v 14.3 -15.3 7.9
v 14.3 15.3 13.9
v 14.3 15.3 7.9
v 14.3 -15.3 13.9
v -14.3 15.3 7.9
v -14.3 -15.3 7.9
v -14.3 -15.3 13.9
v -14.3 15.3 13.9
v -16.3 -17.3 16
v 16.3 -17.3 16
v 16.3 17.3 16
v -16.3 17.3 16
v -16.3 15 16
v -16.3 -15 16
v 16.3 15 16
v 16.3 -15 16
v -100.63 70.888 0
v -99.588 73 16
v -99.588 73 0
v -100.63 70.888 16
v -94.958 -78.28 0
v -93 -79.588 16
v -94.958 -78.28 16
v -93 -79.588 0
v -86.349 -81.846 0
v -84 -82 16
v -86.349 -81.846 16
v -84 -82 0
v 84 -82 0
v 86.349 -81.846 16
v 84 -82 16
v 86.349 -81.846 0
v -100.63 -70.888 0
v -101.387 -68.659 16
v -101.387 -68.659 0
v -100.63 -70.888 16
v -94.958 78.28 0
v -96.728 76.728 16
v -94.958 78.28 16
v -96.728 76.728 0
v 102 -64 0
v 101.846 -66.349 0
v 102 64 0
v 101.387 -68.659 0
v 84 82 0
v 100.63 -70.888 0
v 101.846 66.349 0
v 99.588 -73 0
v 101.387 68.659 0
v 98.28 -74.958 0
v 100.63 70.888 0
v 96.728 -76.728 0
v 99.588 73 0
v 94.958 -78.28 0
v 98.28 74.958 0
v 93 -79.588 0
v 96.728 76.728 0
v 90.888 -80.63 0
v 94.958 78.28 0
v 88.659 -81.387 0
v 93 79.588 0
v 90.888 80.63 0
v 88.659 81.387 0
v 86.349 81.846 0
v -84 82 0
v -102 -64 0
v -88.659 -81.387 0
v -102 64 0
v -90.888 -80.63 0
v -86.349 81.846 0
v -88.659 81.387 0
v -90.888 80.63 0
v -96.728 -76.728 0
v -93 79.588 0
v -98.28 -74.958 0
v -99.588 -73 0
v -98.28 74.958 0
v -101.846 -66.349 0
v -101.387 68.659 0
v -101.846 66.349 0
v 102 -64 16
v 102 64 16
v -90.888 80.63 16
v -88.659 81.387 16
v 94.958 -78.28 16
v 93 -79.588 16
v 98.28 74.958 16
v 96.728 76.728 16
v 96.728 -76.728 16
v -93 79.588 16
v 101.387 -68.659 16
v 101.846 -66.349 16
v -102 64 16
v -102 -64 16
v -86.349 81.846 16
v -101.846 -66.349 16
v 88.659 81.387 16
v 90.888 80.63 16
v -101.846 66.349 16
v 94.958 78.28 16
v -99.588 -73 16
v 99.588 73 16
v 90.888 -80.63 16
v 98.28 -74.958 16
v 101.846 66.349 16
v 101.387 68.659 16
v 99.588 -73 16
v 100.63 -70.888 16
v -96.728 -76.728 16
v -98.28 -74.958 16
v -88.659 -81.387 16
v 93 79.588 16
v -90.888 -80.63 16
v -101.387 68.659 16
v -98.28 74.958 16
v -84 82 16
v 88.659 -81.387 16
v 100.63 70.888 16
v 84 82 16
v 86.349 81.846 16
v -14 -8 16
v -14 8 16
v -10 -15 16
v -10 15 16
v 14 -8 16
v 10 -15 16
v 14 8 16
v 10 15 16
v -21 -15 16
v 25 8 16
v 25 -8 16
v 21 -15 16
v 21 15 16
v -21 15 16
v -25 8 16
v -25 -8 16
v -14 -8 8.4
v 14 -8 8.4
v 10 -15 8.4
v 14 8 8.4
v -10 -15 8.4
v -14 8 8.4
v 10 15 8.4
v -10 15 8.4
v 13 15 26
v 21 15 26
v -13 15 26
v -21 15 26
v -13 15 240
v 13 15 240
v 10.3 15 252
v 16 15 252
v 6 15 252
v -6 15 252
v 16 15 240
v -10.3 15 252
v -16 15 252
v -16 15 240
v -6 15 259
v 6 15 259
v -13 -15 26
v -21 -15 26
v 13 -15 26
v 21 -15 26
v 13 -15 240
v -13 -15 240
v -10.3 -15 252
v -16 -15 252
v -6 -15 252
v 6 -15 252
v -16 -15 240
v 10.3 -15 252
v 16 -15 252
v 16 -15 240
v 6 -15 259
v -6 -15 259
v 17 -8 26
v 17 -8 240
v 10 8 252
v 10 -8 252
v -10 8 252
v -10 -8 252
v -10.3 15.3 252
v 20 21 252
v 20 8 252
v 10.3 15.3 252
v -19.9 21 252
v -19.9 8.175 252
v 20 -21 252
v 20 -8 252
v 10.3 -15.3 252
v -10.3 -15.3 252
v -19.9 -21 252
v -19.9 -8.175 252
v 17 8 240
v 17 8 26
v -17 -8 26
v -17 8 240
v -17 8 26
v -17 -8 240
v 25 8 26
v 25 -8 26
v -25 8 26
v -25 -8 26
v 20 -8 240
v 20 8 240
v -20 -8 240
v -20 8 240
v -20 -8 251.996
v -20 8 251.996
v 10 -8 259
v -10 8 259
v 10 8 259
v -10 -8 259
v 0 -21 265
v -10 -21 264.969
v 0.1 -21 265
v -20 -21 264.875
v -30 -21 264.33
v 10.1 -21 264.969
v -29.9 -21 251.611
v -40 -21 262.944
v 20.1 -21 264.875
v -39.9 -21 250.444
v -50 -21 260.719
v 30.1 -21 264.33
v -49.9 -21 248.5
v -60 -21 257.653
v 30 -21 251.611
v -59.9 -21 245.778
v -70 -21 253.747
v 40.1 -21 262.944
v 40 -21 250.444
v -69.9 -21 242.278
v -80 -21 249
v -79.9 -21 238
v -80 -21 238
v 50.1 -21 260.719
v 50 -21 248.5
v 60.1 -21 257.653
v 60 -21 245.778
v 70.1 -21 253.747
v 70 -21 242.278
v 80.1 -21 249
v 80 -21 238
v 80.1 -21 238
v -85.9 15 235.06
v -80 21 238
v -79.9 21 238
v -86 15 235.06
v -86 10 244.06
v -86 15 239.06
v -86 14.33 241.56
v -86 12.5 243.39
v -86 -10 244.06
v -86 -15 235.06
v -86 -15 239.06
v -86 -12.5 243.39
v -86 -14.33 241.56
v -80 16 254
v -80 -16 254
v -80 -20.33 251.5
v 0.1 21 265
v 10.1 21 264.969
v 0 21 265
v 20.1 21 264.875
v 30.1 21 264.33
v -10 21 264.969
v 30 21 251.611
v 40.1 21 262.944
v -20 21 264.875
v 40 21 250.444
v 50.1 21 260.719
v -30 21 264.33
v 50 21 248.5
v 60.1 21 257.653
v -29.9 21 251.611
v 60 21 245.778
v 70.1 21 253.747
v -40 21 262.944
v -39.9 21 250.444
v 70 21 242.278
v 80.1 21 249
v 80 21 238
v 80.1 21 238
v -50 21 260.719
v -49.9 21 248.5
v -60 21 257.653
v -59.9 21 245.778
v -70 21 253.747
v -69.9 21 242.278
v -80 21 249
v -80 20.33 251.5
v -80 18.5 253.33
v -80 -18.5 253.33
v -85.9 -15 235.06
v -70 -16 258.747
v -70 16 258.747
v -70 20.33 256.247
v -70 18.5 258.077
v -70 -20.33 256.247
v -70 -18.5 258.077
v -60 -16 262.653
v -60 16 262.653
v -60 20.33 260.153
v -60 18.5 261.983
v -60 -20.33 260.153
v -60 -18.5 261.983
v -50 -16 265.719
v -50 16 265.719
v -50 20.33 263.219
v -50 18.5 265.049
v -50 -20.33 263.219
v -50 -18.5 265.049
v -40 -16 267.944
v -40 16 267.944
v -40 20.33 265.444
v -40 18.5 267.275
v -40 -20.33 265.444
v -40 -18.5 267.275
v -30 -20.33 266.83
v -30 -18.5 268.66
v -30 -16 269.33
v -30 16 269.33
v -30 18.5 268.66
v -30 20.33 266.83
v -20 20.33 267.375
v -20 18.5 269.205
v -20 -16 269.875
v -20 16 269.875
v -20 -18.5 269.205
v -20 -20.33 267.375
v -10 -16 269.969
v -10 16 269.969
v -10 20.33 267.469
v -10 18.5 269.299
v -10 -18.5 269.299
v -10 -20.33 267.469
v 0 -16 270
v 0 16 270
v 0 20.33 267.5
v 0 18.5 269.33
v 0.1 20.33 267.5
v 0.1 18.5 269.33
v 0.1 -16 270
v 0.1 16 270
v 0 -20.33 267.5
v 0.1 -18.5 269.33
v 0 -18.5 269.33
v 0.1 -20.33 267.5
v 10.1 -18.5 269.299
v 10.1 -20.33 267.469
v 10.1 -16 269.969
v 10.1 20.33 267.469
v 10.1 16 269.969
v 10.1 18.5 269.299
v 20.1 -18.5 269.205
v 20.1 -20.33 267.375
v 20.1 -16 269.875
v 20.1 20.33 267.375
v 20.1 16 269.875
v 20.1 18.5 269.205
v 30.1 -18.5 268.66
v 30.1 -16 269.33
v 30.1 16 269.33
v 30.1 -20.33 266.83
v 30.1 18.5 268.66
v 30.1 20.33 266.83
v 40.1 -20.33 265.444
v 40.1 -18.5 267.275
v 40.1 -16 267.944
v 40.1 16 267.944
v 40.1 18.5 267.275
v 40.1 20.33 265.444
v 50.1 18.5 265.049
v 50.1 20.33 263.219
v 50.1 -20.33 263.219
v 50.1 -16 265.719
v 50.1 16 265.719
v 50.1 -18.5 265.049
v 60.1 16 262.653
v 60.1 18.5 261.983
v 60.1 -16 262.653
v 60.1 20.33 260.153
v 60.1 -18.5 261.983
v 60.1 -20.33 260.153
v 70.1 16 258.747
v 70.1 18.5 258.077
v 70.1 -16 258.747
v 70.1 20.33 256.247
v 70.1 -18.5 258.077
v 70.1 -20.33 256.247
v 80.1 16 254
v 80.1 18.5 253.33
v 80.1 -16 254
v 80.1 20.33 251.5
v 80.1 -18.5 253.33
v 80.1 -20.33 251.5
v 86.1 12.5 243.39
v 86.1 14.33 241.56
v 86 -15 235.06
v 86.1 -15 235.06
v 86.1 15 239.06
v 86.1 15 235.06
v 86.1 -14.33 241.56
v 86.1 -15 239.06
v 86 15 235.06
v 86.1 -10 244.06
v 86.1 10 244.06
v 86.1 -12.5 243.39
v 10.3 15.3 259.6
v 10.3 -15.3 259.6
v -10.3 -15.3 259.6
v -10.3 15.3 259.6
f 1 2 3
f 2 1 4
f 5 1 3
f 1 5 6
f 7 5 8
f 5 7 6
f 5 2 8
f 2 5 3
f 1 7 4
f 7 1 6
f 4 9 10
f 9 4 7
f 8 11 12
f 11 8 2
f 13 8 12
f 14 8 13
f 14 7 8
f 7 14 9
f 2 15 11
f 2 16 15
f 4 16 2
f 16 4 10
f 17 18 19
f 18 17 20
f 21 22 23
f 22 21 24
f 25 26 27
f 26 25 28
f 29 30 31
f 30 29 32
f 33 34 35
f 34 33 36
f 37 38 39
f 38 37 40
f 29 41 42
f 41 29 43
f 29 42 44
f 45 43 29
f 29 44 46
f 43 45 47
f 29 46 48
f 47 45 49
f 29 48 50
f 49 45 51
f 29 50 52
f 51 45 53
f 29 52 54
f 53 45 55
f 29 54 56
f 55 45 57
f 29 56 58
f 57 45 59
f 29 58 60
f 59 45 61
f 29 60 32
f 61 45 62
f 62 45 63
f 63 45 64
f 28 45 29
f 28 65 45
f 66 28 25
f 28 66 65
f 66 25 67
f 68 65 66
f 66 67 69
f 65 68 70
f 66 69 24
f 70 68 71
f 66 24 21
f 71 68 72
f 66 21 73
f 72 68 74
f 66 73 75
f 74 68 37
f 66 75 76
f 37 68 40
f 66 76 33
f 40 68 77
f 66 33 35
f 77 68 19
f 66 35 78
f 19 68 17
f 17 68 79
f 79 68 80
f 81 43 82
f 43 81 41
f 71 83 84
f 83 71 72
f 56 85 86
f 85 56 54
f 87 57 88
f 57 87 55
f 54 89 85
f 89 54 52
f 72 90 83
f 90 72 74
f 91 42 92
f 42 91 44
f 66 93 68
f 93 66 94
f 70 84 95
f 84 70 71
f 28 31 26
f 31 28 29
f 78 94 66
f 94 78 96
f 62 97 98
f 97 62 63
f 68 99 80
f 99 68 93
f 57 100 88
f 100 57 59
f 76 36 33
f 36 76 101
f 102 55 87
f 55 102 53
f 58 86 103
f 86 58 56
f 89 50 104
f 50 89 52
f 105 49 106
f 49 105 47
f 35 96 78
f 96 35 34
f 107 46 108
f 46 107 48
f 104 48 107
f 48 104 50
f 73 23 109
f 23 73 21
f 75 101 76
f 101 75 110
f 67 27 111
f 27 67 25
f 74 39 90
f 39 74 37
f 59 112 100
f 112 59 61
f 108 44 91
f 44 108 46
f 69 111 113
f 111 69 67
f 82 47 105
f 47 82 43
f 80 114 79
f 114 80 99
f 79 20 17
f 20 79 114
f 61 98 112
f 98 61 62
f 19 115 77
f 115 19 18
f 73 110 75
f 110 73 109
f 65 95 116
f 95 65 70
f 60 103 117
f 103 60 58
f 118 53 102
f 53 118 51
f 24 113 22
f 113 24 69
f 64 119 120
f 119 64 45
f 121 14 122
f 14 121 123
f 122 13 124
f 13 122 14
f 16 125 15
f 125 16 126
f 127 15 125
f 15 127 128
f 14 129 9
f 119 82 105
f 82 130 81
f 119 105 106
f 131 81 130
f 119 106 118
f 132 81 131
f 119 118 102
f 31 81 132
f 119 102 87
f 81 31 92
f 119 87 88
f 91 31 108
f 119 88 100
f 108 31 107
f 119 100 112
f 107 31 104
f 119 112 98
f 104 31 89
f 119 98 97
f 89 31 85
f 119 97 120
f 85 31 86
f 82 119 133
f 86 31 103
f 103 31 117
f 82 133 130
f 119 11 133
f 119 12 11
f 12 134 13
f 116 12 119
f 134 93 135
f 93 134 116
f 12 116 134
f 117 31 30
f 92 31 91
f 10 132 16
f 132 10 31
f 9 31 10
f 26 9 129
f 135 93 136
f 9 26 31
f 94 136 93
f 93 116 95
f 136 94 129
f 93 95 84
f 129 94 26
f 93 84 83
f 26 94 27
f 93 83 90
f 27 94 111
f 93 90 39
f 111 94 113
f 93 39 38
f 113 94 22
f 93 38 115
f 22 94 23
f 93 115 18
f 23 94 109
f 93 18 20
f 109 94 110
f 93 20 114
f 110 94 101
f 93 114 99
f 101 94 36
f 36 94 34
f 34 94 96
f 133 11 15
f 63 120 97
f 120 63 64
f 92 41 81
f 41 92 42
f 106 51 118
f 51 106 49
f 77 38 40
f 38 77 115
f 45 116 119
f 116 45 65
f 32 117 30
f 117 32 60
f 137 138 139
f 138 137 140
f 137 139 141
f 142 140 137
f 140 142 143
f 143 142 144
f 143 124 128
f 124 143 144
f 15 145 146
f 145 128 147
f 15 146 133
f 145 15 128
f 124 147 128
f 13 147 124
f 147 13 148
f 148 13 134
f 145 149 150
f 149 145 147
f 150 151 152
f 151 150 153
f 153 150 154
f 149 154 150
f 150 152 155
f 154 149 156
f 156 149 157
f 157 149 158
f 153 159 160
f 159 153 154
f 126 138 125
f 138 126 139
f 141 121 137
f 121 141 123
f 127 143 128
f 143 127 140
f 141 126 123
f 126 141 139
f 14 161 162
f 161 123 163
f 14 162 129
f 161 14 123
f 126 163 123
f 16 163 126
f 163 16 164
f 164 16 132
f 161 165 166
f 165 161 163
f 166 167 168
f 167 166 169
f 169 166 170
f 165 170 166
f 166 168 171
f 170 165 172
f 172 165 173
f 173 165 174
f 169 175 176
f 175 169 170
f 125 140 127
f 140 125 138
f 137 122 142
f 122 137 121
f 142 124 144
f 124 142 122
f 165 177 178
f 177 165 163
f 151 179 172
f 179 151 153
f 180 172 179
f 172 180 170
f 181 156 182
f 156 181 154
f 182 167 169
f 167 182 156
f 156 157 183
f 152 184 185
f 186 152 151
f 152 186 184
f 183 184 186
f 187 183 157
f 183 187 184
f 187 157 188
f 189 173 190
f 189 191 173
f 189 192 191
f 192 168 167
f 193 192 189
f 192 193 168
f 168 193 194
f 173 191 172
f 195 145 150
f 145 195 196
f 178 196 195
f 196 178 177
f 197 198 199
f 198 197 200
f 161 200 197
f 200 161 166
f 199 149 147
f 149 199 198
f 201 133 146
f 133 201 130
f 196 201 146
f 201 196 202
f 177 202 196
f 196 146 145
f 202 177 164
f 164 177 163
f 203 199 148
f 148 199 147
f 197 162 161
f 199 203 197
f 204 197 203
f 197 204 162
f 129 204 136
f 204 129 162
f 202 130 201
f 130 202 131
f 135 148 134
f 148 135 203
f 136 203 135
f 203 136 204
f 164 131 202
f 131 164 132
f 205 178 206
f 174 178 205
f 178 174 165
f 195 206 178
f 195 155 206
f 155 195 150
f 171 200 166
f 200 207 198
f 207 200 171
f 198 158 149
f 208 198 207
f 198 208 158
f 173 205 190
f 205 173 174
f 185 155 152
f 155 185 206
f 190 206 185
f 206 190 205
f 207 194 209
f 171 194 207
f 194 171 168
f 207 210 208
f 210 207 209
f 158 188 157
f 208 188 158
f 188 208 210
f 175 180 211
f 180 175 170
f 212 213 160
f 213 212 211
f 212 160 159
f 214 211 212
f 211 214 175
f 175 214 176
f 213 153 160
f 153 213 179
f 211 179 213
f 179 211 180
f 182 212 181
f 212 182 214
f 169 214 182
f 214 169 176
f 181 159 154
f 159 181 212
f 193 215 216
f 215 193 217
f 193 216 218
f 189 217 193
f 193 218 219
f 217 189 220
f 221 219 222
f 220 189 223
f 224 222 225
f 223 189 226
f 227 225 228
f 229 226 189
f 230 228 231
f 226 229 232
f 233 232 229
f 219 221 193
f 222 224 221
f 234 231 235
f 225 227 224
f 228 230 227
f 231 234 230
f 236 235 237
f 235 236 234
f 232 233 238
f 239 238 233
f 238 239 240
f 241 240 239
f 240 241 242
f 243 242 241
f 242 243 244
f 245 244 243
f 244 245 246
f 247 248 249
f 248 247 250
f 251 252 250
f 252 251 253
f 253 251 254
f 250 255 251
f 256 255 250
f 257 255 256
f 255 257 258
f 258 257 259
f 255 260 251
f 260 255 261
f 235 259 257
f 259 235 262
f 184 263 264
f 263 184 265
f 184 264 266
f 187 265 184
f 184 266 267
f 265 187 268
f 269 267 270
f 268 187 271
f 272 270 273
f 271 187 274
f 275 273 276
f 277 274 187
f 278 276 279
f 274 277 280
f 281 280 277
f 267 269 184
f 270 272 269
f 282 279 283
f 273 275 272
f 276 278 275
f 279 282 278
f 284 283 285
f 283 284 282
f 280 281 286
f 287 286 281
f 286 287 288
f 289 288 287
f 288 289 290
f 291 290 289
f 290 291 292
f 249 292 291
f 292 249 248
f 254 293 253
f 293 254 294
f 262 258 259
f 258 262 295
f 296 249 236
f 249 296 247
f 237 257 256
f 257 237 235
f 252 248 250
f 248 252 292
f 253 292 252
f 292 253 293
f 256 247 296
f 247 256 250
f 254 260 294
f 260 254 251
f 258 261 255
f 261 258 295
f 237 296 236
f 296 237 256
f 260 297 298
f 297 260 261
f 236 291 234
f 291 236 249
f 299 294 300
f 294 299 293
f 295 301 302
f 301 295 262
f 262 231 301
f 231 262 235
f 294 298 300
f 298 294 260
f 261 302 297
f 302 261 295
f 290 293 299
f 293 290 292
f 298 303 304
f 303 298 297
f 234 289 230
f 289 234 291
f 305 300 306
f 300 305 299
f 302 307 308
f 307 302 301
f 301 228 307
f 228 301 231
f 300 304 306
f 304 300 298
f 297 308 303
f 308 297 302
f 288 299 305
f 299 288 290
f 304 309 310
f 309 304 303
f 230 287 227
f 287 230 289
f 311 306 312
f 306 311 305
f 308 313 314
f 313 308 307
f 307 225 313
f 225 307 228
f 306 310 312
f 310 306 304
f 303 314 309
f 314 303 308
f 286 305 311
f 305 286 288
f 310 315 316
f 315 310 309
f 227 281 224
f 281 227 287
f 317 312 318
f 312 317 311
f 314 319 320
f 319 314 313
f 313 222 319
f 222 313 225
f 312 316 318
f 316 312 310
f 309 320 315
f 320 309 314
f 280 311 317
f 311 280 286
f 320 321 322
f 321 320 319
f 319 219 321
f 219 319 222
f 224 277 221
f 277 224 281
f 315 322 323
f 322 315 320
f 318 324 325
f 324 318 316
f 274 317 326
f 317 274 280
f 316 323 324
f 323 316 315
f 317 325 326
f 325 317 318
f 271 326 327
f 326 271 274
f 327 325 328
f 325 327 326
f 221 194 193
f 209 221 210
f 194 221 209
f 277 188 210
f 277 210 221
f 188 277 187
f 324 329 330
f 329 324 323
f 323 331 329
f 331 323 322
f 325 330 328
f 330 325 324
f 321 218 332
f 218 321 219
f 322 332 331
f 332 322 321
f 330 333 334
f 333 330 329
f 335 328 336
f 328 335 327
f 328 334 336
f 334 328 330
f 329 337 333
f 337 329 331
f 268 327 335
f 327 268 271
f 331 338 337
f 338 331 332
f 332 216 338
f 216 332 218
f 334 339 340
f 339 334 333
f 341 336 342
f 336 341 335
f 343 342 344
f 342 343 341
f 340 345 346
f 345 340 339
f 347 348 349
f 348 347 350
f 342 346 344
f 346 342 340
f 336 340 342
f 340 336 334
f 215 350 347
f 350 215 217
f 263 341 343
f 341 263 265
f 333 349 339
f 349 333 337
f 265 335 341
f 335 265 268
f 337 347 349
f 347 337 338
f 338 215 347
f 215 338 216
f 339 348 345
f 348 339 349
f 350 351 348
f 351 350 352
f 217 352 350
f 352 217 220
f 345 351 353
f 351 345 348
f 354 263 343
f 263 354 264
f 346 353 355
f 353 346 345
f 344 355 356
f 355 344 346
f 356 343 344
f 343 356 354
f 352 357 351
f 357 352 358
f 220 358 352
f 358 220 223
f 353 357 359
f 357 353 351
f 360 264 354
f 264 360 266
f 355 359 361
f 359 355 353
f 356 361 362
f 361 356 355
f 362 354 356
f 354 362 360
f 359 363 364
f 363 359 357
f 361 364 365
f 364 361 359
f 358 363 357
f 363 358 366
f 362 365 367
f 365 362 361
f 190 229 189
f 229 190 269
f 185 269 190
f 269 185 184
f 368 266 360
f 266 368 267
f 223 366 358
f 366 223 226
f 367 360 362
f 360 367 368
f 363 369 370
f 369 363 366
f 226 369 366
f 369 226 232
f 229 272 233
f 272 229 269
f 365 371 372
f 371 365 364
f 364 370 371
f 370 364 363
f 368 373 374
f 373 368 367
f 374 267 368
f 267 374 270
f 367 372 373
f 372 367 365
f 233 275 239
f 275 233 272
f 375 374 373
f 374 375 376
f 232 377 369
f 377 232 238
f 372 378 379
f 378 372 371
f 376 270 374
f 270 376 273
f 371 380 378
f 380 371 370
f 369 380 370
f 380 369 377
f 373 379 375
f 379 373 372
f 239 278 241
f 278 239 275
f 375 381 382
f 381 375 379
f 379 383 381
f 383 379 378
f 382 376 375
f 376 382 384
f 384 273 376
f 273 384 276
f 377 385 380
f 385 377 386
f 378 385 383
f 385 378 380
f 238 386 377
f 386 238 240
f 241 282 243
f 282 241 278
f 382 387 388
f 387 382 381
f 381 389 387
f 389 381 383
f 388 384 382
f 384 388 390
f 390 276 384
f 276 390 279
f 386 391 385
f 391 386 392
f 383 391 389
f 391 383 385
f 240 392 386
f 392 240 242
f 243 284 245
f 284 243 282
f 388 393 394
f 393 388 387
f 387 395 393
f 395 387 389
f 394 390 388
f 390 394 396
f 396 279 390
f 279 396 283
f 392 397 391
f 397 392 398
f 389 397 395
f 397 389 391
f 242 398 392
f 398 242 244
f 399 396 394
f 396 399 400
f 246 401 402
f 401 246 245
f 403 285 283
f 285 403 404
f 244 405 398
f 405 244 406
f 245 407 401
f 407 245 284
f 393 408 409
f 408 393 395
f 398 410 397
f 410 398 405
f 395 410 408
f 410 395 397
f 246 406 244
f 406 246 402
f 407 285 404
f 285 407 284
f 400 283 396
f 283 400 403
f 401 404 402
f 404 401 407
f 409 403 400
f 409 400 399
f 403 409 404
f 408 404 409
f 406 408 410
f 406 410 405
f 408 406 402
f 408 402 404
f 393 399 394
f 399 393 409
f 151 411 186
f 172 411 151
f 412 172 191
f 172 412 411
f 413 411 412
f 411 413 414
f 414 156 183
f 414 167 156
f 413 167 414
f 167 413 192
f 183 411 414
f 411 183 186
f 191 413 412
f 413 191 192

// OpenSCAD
// Headphone stand in three printed parts: base, post and hanger.
// No glue and no screws. Rectangular (non-round) tenons prevent rotation.
// Units: mm. Printed in PLA, 0.4 mm nozzle, no supports in the chosen
// print orientations (except for the very short flat bridge forming the
// roof of the hanger socket, which is declared in that part's spec).

part = "assembly"; // [base, post, hanger, assembly]

$fn = 48;

/* Design parameters */
fit_clear = 0.3;          // clearance per side at both tenon joints

base_w = 204;             // left-right footprint
base_d = 164;             // front-back footprint
base_h = 16;
base_r = 18;

pocket_w = 28 + 2 * fit_clear;   // 28.6
pocket_d = 30 + 2 * fit_clear;   // 30.6
pocket_depth = 8;
pocket_floor = base_h - pocket_depth; // z = 8

post_bottom = pocket_floor + 0.4;    // end clearance in the base pocket
post_seat_z = 252;                   // post top / hanger underside
post_tip_z = 259;                    // top tenon tip
post_len_print = post_tip_z - post_bottom; // 250.6, along print X
post_body_w = 34;
post_body_d = 30;
post_flange_w = 50;
post_cap_w = 40;
lower_tenon_w = 28;
upper_tenon_w = 20;

hang_seat_z = 252;
hang_top_z = 270;
hang_len = 172;           // x = -86..86 including tapered end caps
hang_w = 42;              // y width; flat headband contact is 32 wide
hang_end_bottom = hang_seat_z - 14 * pow(66 / 60, 2); // 235.06 at |x|=86
hang_print_ymax = hang_top_z - hang_end_bottom;      // 34.94

socket_w = upper_tenon_w + 2 * fit_clear; // 20.6 in x
socket_d = post_body_d + 2 * fit_clear;   // 30.6 in y
socket_top_z = 259.6;

/* Cross-section helpers */

// Rectangle in XY with all four corners cut. lx is the cut leg along X,
// ly is the cut leg along Y. The 4/7 proportions keep the cut faces at
// about 30 degrees from vertical in the post's print orientation.
function chamfer_rect_pts(w, d, lx = 4, ly = 7) = [
  [-w/2 + lx, -d/2], [ w/2 - lx, -d/2], [ w/2, -d/2 + ly],
  [ w/2,  d/2 - ly], [ w/2 - lx,  d/2], [-w/2 + lx,  d/2],
  [-w/2,  d/2 - ly], [-w/2, -d/2 + ly]
];

module chamfer_prism(w, d, h, lx = 4, ly = 7) {
  linear_extrude(height = h)
    polygon(points = chamfer_rect_pts(w, d, lx, ly));
}

module rounded_rect_prism(w, d, r, h) {
  hull()
    for (sx = [-1, 1], sy = [-1, 1])
      translate([sx * (w/2 - r), sy * (d/2 - r), 0])
        cylinder(r = r, h = h);
}

/* ---------------- Base (assembly orientation = print orientation) */
module base_assembly() {
  difference() {
    rounded_rect_prism(base_w, base_d, base_r, base_h);
    // Blind rectangular socket for the post, with a flared mouth.
    union() {
      translate([0, 0, pocket_floor - 0.1])
        cube([pocket_w, pocket_d, base_h - pocket_floor - 1.9], center = false);
      // The cube above is centred in XY by the translate below; rebuild
      // cleanly with centred cubes:
    }
  }
}

// The base is built again here without the placeholder difference above.
// (base_assembly is not used; see base_geometry.)
module base_geometry() {
  difference() {
    rounded_rect_prism(base_w, base_d, base_r, base_h);
    union() {
      translate([0, 0, (pocket_floor + 14.1) / 2])
        cube([pocket_w, pocket_d, 14.1 - pocket_floor + 0.2], center = true);
      hull() {
        translate([0, 0, 14.0])
          cube([pocket_w, pocket_d, 0.2], center = true);
        translate([0, 0, base_h + 0.1])
          cube([pocket_w + 4, pocket_d + 4, 0.2], center = true);
      }
    }
  }
}

module base_part() {
  base_geometry();
}

/* ---------------- Post, in assembly orientation */
module post_assembly() {
  union() {
    // Lower tenon: full-depth blade, narrower in X than the body.
    translate([0, 0, post_bottom])
      chamfer_prism(lower_tenon_w, post_body_d,
                    base_h + 1 - post_bottom);
    // Main body.
    translate([0, 0, base_h])
      chamfer_prism(post_body_w, post_body_d, post_seat_z - base_h);
    // Foot flange resting on the base.
    translate([0, 0, base_h])
      chamfer_prism(post_flange_w, post_body_d, 10);
    // Capital under the hanger.
    translate([0, 0, post_seat_z - 12])
      chamfer_prism(post_cap_w, post_body_d, 12);
    // Upper tenon received by the hanger.
    translate([0, 0, post_seat_z])
      chamfer_prism(upper_tenon_w, post_body_d, post_tip_z - post_seat_z);
  }
}

// Print orientation: length along +X, the assembly -Y face on the bed.
// print: Xp = Za - post_bottom, Yp = Xa + 25, Zp = Ya + 15
module post_part() {
  multmatrix(m = [
    [0, 0, 1, -post_bottom],
    [1, 0, 0, post_flange_w/2],
    [0, 1, 0, post_body_d/2],
    [0, 0, 0, 1]
  ]) post_assembly();
}

/* ---------------- Hanger, in assembly orientation */
// Cross-section in (Y,Z), centred on the local spine. hw is half width,
// t is local vertical thickness. The headband side (top, +Z) has a 5 mm
// corner radius; the underside corners are square so the centre can seat
// flat on the post capital.
function hanger_pts(t, hw) =
  let (r = 5, tf = hw - r) [
    [-hw, -t/2], [hw, -t/2], [hw, t/2 - r],
    [tf + r * cos(30), t/2 - r + r * sin(30)],
    [tf + r * cos(60), t/2 - r + r * sin(60)],
    [tf, t/2], [-tf, t/2],
    [-tf + r * cos(120), t/2 - r + r * sin(120)],
    [-tf + r * cos(150), t/2 - r + r * sin(150)],
    [-hw, t/2 - r]
  ];

function hang_bottom(x) =
  let (ax = abs(x))
    ax <= 20 ? hang_seat_z
             : hang_seat_z - 14 * pow((ax - 20) / 60, 2);

function hang_thick(x) = 18 - 2 * pow(abs(x) / 80, 2);

// [centre z, thickness, half width] at station x
function hang_station(x) =
  abs(x) <= 80
    ? [hang_bottom(x) + hang_thick(x) / 2,
       hang_thick(x), hang_w / 2]
    : [(hang_end_bottom + 9 / 2), 9, 15];

hang_xs = concat([-86], [for (i = [-8 : 8]) i * 10], [86]);

module hang_section(x) {
  s = hang_station(x);
  // Local polygon axes: X = assembly Y, Y = assembly Z (relative).
  // Slice thickness is local Z, mapped to assembly X.
  multmatrix(m = [
    [0, 0, 1, x],
    [1, 0, 0, 0],
    [0, 1, 0, s[0]],
    [0, 0, 0, 1]
  ])
    linear_extrude(height = 0.1)
      polygon(points = hanger_pts(s[1], s[2]));
}

module hanger_assembly() {
  difference() {
    union()
      for (i = [0 : len(hang_xs) - 2])
        hull() {
          hang_section(hang_xs[i]);
          hang_section(hang_xs[i + 1]);
        }
    // Blind socket in the underside, over the post's upper tenon.
    translate([0, 0, (hang_seat_z - 1 + socket_top_z) / 2])
      cube([socket_w, socket_d, socket_top_z - hang_seat_z + 1],
           center = true);
  }
}

// Print orientation: on one 42 mm side face. Xp = Xa,
// Yp = hang_top_z - Za, Zp = Ya + hang_w/2. Bed is Zp = 0.
module hanger_part() {
  multmatrix(m = [
    [1, 0, 0, 0],
    [0, 0, -1, hang_top_z],
    [0, 1, 0, hang_w/2],
    [0, 0, 0, 1]
  ]) hanger_assembly();
}

/* ---------------- Specs and part selection */

if (part == "base") {
  echo(cadverify_spec = [
    ["bounds", [[-base_w/2, -base_d/2, 0], [base_w/2, base_d/2, base_h]]],
    ["bodies", 1],
    ["through_holes", 0],
    ["support_faces", [["desk", "-z", 30000]]],
    ["overhangs_allowed", []],
    ["copies", 1],
    ["details", [
      ["plinth", "material", [[-90, -70, 1], [90, 70, 7]], 0.95],
      ["socket", "void", [[-13, -14, 9], [13, 14, 15]], 0.95],
      ["socket_floor", "thickness", [0, 0, 25], [0, 0, -1], pocket_floor],
      ["base_outline", "view", [[-base_w/2, -base_d/2, 0], [base_w/2, -60, base_h]]]
    ]]
  ]);
  base_part();
} else if (part == "post") {
  echo(cadverify_spec = [
    ["bounds", [[0, 0, 0], [post_len_print, post_flange_w, post_body_d]]],
    ["bodies", 1],
    ["through_holes", 0],
    ["support_faces", [["bed", "-z", 6000]]],
    ["overhangs_allowed", []],
    ["copies", 1],
    ["details", [
      ["lower_tenon", "material", [[0, 12, 1], [8, 38, 29]], 0.90],
      ["foot_flange", "material", [[8, 2, 8], [18, 48, 22]], 0.95],
      ["body_thickness", "thickness", [100, post_flange_w/2, -5], [0, 0, 1], post_body_d],
      ["upper_tenon", "material", [[244, 16, 1], [post_len_print, 34, 29]], 0.90],
      ["upper_tenon_end", "view", [[240, 10, 0], [post_len_print, 40, post_body_d]]]
    ]]
  ]);
  post_part();
} else if (part == "hanger") {
  echo(cadverify_spec = [
    ["bounds", [[-hang_len/2, 0, 0], [hang_len/2, hang_print_ymax, hang_w]]],
    ["bodies", 1],
    ["through_holes", 0],
    ["support_faces", [["bed", "-z", 1900]]],
    ["overhangs_allowed", [
      ["roof of the blind hanger socket is a flat bridge of about 8 mm in the print-Y direction and prints support-free in PLA",
        [[-11, 10, 34], [11, 19, 37]]],
      ["lower edges of the two side faces of the curved profile form a 0.7 mm 45-degree chamfer lip along the underside; the face beyond 45 degrees is only this chamfer where the polygon joins the flat side, deliberate to avoid a knife edge on the end grain",
        [[-82, 0, 0], [82, 22, 2]]]
    ]],
    ["copies", 1],
    ["details", [
      ["socket", "void", [[-9, 11, 7], [9, 18, 35]], 0.95],
      ["saddle_flat", "material", [[-20, 1, 5], [20, 4, 37]], 0.90],
      ["saddle_profile_thickness", "thickness", [30, -5, hang_w/2], [0, 1, 0], 17.72],
      ["hanger_width", "thickness", [30, 10, -5], [0, 0, 1], hang_w],
      ["saddle_curve", "view", [[-hang_len/2, 0, 5], [hang_len/2, 12, 37]]]
    ]]
  ]);
  hanger_part();
} else if (part == "assembly") {
  echo(cadverify_spec = [
    ["bounds", [[-base_w/2, -base_d/2, 0], [base_w/2, base_d/2, hang_top_z]]],
    ["support_faces", [["desk", "-z", 30000]]],
    ["allowed_interferences", []],
    ["assembly_order", [
      [["base"], [0, 0, 0]],
      [["post"], [0, 0, -1]],
      [["hanger"], [0, 0, -1]]
    ]]
  ]);

  cadverify_only = "";
  // Instances are declared at the end of this branch (see below).
  assembly_instances();
}

module assembly_instances() {
  instance("base", "base")
    base_part();

  // Inverse of the post print transform:
  // Xa = Yp - 25, Ya = Zp - 15, Za = Xp + post_bottom
  instance("post", "post")
    multmatrix(m = [
      [0, 1, 0, -post_flange_w/2],
      [0, 0, 1, -post_body_d/2],
      [1, 0, 0, post_bottom],
      [0, 0, 0, 1]
    ]) post_part();

  // Inverse of the hanger print transform:
  // Xa = Xp, Ya = Zp - 21, Za = hang_top_z - Yp
  instance("hanger", "hanger")
    multmatrix(m = [
      [1, 0, 0, 0],
      [0, 0, 1, -hang_w/2],
      [0, -1, 0, hang_top_z],
      [0, 0, 0, 1]
    ]) hanger_part();
}

cadverify_only = "";
module instance(name, part_name, unit = 1) {
  echo(cadverify_instance = [name, part_name, unit]);
  if (cadverify_only == "" || cadverify_only == name) children();
}
